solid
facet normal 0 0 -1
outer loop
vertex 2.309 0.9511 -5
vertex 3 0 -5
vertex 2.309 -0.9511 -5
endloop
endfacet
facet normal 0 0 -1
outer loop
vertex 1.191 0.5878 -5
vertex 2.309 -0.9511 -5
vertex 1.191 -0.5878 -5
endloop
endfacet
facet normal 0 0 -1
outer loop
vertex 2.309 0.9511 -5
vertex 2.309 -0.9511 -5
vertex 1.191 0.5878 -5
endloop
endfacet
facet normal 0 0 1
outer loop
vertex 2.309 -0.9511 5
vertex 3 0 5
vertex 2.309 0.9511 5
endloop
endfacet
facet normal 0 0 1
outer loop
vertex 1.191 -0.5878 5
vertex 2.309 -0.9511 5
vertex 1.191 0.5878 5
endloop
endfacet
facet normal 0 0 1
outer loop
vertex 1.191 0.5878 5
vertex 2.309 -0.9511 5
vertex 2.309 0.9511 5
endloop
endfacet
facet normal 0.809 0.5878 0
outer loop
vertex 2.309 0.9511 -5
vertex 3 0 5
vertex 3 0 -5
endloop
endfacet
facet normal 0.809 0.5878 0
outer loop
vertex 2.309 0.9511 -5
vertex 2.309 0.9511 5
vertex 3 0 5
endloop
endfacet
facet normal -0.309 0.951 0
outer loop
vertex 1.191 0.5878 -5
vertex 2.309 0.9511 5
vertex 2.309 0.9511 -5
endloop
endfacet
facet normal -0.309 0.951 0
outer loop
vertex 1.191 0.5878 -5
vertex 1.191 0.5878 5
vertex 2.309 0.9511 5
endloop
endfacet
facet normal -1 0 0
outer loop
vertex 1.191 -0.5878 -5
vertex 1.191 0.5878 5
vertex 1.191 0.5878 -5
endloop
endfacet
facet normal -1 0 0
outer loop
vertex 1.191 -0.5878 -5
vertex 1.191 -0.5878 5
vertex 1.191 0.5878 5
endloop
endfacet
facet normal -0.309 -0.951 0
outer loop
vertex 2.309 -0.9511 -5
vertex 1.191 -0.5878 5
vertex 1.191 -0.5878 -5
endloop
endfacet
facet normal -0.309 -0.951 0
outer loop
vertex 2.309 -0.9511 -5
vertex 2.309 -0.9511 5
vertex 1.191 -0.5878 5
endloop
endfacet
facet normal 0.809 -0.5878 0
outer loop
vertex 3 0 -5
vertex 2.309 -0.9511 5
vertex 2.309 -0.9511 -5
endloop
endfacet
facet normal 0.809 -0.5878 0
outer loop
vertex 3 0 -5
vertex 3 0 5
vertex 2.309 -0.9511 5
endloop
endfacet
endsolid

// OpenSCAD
// Unit of length: Unit.MM
linear_extrude(height = 10.0, center = true, convexity = 10, twist = 0.0, scale = 1.0)
{
   translate(v = [2.0, 0.0])
   {
      circle(d = 2.0);
   }
}
